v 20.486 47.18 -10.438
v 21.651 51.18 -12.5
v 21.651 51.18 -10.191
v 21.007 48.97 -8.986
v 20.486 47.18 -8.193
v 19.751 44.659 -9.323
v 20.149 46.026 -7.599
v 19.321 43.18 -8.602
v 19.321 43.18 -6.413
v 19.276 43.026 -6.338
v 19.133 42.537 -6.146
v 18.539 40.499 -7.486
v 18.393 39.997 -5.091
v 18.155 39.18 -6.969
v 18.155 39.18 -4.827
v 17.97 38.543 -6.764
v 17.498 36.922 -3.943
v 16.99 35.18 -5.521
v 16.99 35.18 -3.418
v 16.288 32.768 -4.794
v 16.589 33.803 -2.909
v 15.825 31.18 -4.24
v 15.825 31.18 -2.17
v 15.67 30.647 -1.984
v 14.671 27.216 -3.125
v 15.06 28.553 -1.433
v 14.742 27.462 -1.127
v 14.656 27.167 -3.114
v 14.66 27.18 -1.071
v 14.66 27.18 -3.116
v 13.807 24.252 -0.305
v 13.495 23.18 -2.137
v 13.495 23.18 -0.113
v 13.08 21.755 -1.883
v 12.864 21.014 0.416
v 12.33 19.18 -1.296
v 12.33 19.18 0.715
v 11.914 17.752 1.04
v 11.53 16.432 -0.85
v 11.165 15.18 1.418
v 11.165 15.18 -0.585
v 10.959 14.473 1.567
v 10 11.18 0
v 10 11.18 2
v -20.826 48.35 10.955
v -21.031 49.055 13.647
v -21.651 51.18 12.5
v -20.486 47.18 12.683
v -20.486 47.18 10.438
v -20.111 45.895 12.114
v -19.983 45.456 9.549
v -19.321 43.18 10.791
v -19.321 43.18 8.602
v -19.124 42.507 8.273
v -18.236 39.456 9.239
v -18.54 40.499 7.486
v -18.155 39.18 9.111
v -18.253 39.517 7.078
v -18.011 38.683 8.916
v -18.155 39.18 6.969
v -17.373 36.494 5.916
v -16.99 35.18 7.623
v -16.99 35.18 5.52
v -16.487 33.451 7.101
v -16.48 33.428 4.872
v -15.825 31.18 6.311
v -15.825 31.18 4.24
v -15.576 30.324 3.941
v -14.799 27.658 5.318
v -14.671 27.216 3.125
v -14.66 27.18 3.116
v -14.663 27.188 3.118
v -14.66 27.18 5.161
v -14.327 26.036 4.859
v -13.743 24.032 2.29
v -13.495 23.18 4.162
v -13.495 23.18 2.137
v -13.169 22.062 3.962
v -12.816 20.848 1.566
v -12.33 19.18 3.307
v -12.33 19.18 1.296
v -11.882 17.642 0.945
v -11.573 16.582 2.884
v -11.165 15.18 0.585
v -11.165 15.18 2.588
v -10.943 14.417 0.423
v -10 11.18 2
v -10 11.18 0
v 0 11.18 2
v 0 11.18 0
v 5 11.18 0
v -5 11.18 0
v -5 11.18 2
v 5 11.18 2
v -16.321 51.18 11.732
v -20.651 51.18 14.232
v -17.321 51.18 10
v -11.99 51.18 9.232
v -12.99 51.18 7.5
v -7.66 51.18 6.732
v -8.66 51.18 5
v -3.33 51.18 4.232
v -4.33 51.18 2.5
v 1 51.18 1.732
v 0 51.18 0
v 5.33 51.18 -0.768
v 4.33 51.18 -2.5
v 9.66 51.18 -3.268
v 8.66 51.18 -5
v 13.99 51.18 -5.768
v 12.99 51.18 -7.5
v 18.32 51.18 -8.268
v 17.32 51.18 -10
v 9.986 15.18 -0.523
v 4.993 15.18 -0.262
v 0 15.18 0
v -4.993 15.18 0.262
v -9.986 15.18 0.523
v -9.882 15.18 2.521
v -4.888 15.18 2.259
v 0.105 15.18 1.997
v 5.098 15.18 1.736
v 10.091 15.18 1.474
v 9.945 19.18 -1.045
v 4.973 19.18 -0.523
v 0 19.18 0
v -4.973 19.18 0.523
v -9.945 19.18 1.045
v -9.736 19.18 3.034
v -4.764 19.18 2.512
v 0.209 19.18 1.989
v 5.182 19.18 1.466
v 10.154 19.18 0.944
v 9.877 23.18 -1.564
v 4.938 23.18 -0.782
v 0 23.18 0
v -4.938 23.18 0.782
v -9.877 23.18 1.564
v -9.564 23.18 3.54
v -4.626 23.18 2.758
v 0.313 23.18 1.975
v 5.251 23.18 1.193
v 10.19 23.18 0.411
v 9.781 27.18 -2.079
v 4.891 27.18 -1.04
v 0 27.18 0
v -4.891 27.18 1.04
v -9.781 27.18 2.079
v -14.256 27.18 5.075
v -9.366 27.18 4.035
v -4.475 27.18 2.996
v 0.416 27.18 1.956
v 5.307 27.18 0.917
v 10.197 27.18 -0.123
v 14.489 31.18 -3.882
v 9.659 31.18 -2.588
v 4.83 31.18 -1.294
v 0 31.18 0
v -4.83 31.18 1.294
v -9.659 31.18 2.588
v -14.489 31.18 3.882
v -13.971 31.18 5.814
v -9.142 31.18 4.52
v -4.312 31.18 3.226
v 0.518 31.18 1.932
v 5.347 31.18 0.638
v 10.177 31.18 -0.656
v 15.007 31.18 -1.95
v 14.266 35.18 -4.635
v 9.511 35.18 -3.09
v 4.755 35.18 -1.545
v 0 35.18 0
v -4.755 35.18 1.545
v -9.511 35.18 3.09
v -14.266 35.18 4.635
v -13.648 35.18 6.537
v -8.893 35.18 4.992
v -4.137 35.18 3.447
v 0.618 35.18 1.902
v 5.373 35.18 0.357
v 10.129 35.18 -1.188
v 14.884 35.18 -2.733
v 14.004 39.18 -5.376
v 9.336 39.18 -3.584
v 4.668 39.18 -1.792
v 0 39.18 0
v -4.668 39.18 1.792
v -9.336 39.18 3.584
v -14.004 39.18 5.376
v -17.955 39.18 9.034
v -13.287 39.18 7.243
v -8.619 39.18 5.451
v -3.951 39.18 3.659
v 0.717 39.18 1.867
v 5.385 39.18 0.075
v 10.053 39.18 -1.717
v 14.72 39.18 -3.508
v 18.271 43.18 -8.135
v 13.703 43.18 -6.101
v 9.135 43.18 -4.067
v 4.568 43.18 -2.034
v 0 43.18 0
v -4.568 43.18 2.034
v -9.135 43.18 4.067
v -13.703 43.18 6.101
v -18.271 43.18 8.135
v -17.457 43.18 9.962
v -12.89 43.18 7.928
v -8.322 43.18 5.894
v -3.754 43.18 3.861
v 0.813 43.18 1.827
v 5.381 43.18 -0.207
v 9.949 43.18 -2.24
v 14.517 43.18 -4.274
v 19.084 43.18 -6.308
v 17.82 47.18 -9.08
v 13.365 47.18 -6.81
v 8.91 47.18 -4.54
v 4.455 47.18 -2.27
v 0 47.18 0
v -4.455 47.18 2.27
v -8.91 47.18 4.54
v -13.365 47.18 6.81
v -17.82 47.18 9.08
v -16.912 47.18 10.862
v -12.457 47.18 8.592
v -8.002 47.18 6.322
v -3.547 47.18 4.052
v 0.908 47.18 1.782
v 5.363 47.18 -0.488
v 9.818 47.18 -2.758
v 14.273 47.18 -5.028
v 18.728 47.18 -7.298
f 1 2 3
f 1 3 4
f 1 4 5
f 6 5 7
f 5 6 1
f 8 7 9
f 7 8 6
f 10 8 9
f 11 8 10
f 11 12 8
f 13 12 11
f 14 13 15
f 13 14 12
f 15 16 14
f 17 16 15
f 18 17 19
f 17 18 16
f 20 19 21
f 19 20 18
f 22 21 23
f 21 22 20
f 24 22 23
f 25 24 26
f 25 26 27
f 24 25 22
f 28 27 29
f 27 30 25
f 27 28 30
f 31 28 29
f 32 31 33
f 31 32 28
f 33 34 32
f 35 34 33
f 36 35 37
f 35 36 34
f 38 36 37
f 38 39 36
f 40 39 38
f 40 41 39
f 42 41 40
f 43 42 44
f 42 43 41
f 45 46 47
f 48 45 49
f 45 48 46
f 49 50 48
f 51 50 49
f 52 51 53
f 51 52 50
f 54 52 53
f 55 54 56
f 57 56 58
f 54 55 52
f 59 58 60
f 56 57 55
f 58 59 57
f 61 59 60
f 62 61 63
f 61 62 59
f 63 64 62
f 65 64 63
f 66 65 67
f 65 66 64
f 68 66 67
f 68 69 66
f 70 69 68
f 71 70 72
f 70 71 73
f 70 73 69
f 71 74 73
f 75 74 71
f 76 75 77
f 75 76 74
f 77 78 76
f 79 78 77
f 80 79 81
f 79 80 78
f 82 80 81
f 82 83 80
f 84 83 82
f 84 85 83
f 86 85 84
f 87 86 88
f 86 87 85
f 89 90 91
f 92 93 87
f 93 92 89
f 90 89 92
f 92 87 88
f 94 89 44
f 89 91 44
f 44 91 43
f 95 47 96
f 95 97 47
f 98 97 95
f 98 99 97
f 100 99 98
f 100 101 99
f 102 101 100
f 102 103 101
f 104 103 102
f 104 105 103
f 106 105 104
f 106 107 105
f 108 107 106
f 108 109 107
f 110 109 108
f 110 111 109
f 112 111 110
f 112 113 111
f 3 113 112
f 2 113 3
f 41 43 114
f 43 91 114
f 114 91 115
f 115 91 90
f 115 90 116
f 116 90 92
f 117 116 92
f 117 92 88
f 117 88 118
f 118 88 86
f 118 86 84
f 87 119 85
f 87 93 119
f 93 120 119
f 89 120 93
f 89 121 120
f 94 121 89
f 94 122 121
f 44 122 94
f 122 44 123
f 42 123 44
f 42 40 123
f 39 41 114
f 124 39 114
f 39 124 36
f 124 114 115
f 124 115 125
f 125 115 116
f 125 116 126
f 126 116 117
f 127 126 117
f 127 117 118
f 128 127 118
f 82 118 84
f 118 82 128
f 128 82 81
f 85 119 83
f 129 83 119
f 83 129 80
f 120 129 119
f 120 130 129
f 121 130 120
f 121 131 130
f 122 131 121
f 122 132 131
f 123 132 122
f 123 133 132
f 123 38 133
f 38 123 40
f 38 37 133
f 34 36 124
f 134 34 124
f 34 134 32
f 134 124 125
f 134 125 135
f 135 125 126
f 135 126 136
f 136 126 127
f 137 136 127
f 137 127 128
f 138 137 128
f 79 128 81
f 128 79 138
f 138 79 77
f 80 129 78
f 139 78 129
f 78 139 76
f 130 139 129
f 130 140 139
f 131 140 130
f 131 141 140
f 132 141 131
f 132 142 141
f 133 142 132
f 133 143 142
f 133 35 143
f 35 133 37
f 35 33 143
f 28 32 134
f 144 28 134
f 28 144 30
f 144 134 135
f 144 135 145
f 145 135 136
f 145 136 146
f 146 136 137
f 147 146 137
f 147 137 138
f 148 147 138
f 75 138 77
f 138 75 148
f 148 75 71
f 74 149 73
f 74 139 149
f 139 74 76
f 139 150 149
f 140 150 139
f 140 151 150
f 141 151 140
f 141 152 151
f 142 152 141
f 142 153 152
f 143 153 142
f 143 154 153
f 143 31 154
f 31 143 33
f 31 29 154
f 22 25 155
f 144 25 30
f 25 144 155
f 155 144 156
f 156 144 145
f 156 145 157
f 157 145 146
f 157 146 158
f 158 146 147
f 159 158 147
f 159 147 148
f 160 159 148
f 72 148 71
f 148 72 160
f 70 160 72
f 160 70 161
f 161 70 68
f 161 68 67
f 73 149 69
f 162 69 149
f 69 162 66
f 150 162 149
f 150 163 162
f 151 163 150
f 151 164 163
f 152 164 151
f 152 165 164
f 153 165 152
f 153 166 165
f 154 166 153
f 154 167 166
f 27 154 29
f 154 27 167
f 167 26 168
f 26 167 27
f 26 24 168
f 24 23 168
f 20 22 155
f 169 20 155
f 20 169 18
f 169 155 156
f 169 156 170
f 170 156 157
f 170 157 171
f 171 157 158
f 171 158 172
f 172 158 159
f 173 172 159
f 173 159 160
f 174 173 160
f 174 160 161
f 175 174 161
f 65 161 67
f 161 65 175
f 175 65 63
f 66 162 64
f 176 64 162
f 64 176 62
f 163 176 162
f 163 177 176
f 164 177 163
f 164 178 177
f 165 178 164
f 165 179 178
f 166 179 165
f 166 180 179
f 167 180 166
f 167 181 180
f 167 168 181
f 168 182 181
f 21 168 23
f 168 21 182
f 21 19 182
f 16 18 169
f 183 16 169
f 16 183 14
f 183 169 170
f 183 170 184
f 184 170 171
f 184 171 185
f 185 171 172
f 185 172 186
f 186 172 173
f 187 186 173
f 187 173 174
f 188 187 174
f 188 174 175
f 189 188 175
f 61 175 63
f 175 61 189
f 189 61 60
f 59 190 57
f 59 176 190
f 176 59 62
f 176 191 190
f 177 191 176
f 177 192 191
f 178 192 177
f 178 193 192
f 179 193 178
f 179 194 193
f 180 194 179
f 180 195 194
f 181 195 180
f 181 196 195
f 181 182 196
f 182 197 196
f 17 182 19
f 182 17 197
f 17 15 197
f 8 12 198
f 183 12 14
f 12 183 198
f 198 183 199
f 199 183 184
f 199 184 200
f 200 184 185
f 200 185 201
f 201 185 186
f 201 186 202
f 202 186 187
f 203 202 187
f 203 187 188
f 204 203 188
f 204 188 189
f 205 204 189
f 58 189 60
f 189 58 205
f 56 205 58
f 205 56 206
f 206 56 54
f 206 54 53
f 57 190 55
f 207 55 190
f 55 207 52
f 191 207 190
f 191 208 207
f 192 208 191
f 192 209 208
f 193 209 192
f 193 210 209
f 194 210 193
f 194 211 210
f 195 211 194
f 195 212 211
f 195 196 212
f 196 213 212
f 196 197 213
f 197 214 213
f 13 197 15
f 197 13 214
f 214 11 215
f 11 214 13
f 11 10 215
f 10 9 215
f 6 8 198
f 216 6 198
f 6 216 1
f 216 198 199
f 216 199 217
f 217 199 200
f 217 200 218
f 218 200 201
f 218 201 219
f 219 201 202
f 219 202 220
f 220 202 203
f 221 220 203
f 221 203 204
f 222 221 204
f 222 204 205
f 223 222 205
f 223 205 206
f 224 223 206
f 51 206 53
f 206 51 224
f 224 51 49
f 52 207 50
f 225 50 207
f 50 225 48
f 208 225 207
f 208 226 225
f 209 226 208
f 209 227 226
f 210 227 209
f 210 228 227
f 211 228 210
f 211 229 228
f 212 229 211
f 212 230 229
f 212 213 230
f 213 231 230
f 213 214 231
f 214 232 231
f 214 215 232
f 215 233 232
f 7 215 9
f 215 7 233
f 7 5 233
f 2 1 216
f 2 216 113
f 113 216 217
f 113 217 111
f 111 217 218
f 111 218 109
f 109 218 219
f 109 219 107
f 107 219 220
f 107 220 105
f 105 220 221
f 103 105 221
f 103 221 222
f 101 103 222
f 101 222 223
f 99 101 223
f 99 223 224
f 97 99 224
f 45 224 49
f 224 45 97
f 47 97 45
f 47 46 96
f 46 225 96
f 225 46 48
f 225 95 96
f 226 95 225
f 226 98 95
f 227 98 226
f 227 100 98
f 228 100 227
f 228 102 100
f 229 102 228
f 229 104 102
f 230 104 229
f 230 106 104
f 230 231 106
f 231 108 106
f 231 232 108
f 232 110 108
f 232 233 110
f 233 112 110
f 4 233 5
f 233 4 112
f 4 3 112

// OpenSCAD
module fan_wheel(
    outer_radius = 55,
    inner_radius = 15,
    blade_count = 8,
    outer_width = 50,
    inner_width = 20,
    thickness = 2,
    twist = -30,
    angle_of_attack = 45,
) {
    
    module blade() {
        
        inner_height = cos( asin( inner_width / ( 2 * inner_radius ) )) * inner_radius;
        
        blade_height = outer_radius - inner_radius;
        
        width = outer_width / 2 - inner_width / 2;
        
        depth = 
            sqrt(
                pow( ( outer_width / 2 * cos( abs ( twist ) ) ) -
                        ( inner_width / 2 ), 2 ) +
                pow (blade_height, 2 )
            ) + thickness;
        
        height = sin ( abs ( twist ) ) * outer_width / 2 + thickness;
        
        angle = 
            atan(
                    ( ( outer_width / 2 * cos( abs ( twist ) ) ) -
                        ( inner_width / 2 )
                    ) / blade_height
            );
        
        blade_divisions = 10;
        
        difference() {
        
            translate( [ 0, inner_height, 0 ])
            rotate( [-90, 0, 0 ] )
            linear_extrude(
                height = blade_height,
                twist = twist,
                slices = 10,
                convexity = 10
            )
            translate( [ -outer_width / 2, -thickness])
            polygon(
                concat(
                    [for ( i = [ 0: blade_divisions])
                        [ i * outer_width / blade_divisions, (i % 2) * 0.0001 ]
                        ],
                    [for (i = [blade_divisions : -1 : 0])
                        [ i * outer_width / blade_divisions, thickness + ( i % 2) * 0.0001]
                        ]                        
                )
            );
            
            for ( i = [0 : 1])
            mirror( [i, 0, 0] )
            translate( [ inner_width / 2, inner_height, -height ] )
            rotate( [ 0, 0, -angle] )
            translate( [ 0, -depth / 2, 0 ] )
            cube( [ width * 2, depth * 1.5, 2 * height] );
        }
        
    }
    
    blade(); // debug
}

fan_wheel();
